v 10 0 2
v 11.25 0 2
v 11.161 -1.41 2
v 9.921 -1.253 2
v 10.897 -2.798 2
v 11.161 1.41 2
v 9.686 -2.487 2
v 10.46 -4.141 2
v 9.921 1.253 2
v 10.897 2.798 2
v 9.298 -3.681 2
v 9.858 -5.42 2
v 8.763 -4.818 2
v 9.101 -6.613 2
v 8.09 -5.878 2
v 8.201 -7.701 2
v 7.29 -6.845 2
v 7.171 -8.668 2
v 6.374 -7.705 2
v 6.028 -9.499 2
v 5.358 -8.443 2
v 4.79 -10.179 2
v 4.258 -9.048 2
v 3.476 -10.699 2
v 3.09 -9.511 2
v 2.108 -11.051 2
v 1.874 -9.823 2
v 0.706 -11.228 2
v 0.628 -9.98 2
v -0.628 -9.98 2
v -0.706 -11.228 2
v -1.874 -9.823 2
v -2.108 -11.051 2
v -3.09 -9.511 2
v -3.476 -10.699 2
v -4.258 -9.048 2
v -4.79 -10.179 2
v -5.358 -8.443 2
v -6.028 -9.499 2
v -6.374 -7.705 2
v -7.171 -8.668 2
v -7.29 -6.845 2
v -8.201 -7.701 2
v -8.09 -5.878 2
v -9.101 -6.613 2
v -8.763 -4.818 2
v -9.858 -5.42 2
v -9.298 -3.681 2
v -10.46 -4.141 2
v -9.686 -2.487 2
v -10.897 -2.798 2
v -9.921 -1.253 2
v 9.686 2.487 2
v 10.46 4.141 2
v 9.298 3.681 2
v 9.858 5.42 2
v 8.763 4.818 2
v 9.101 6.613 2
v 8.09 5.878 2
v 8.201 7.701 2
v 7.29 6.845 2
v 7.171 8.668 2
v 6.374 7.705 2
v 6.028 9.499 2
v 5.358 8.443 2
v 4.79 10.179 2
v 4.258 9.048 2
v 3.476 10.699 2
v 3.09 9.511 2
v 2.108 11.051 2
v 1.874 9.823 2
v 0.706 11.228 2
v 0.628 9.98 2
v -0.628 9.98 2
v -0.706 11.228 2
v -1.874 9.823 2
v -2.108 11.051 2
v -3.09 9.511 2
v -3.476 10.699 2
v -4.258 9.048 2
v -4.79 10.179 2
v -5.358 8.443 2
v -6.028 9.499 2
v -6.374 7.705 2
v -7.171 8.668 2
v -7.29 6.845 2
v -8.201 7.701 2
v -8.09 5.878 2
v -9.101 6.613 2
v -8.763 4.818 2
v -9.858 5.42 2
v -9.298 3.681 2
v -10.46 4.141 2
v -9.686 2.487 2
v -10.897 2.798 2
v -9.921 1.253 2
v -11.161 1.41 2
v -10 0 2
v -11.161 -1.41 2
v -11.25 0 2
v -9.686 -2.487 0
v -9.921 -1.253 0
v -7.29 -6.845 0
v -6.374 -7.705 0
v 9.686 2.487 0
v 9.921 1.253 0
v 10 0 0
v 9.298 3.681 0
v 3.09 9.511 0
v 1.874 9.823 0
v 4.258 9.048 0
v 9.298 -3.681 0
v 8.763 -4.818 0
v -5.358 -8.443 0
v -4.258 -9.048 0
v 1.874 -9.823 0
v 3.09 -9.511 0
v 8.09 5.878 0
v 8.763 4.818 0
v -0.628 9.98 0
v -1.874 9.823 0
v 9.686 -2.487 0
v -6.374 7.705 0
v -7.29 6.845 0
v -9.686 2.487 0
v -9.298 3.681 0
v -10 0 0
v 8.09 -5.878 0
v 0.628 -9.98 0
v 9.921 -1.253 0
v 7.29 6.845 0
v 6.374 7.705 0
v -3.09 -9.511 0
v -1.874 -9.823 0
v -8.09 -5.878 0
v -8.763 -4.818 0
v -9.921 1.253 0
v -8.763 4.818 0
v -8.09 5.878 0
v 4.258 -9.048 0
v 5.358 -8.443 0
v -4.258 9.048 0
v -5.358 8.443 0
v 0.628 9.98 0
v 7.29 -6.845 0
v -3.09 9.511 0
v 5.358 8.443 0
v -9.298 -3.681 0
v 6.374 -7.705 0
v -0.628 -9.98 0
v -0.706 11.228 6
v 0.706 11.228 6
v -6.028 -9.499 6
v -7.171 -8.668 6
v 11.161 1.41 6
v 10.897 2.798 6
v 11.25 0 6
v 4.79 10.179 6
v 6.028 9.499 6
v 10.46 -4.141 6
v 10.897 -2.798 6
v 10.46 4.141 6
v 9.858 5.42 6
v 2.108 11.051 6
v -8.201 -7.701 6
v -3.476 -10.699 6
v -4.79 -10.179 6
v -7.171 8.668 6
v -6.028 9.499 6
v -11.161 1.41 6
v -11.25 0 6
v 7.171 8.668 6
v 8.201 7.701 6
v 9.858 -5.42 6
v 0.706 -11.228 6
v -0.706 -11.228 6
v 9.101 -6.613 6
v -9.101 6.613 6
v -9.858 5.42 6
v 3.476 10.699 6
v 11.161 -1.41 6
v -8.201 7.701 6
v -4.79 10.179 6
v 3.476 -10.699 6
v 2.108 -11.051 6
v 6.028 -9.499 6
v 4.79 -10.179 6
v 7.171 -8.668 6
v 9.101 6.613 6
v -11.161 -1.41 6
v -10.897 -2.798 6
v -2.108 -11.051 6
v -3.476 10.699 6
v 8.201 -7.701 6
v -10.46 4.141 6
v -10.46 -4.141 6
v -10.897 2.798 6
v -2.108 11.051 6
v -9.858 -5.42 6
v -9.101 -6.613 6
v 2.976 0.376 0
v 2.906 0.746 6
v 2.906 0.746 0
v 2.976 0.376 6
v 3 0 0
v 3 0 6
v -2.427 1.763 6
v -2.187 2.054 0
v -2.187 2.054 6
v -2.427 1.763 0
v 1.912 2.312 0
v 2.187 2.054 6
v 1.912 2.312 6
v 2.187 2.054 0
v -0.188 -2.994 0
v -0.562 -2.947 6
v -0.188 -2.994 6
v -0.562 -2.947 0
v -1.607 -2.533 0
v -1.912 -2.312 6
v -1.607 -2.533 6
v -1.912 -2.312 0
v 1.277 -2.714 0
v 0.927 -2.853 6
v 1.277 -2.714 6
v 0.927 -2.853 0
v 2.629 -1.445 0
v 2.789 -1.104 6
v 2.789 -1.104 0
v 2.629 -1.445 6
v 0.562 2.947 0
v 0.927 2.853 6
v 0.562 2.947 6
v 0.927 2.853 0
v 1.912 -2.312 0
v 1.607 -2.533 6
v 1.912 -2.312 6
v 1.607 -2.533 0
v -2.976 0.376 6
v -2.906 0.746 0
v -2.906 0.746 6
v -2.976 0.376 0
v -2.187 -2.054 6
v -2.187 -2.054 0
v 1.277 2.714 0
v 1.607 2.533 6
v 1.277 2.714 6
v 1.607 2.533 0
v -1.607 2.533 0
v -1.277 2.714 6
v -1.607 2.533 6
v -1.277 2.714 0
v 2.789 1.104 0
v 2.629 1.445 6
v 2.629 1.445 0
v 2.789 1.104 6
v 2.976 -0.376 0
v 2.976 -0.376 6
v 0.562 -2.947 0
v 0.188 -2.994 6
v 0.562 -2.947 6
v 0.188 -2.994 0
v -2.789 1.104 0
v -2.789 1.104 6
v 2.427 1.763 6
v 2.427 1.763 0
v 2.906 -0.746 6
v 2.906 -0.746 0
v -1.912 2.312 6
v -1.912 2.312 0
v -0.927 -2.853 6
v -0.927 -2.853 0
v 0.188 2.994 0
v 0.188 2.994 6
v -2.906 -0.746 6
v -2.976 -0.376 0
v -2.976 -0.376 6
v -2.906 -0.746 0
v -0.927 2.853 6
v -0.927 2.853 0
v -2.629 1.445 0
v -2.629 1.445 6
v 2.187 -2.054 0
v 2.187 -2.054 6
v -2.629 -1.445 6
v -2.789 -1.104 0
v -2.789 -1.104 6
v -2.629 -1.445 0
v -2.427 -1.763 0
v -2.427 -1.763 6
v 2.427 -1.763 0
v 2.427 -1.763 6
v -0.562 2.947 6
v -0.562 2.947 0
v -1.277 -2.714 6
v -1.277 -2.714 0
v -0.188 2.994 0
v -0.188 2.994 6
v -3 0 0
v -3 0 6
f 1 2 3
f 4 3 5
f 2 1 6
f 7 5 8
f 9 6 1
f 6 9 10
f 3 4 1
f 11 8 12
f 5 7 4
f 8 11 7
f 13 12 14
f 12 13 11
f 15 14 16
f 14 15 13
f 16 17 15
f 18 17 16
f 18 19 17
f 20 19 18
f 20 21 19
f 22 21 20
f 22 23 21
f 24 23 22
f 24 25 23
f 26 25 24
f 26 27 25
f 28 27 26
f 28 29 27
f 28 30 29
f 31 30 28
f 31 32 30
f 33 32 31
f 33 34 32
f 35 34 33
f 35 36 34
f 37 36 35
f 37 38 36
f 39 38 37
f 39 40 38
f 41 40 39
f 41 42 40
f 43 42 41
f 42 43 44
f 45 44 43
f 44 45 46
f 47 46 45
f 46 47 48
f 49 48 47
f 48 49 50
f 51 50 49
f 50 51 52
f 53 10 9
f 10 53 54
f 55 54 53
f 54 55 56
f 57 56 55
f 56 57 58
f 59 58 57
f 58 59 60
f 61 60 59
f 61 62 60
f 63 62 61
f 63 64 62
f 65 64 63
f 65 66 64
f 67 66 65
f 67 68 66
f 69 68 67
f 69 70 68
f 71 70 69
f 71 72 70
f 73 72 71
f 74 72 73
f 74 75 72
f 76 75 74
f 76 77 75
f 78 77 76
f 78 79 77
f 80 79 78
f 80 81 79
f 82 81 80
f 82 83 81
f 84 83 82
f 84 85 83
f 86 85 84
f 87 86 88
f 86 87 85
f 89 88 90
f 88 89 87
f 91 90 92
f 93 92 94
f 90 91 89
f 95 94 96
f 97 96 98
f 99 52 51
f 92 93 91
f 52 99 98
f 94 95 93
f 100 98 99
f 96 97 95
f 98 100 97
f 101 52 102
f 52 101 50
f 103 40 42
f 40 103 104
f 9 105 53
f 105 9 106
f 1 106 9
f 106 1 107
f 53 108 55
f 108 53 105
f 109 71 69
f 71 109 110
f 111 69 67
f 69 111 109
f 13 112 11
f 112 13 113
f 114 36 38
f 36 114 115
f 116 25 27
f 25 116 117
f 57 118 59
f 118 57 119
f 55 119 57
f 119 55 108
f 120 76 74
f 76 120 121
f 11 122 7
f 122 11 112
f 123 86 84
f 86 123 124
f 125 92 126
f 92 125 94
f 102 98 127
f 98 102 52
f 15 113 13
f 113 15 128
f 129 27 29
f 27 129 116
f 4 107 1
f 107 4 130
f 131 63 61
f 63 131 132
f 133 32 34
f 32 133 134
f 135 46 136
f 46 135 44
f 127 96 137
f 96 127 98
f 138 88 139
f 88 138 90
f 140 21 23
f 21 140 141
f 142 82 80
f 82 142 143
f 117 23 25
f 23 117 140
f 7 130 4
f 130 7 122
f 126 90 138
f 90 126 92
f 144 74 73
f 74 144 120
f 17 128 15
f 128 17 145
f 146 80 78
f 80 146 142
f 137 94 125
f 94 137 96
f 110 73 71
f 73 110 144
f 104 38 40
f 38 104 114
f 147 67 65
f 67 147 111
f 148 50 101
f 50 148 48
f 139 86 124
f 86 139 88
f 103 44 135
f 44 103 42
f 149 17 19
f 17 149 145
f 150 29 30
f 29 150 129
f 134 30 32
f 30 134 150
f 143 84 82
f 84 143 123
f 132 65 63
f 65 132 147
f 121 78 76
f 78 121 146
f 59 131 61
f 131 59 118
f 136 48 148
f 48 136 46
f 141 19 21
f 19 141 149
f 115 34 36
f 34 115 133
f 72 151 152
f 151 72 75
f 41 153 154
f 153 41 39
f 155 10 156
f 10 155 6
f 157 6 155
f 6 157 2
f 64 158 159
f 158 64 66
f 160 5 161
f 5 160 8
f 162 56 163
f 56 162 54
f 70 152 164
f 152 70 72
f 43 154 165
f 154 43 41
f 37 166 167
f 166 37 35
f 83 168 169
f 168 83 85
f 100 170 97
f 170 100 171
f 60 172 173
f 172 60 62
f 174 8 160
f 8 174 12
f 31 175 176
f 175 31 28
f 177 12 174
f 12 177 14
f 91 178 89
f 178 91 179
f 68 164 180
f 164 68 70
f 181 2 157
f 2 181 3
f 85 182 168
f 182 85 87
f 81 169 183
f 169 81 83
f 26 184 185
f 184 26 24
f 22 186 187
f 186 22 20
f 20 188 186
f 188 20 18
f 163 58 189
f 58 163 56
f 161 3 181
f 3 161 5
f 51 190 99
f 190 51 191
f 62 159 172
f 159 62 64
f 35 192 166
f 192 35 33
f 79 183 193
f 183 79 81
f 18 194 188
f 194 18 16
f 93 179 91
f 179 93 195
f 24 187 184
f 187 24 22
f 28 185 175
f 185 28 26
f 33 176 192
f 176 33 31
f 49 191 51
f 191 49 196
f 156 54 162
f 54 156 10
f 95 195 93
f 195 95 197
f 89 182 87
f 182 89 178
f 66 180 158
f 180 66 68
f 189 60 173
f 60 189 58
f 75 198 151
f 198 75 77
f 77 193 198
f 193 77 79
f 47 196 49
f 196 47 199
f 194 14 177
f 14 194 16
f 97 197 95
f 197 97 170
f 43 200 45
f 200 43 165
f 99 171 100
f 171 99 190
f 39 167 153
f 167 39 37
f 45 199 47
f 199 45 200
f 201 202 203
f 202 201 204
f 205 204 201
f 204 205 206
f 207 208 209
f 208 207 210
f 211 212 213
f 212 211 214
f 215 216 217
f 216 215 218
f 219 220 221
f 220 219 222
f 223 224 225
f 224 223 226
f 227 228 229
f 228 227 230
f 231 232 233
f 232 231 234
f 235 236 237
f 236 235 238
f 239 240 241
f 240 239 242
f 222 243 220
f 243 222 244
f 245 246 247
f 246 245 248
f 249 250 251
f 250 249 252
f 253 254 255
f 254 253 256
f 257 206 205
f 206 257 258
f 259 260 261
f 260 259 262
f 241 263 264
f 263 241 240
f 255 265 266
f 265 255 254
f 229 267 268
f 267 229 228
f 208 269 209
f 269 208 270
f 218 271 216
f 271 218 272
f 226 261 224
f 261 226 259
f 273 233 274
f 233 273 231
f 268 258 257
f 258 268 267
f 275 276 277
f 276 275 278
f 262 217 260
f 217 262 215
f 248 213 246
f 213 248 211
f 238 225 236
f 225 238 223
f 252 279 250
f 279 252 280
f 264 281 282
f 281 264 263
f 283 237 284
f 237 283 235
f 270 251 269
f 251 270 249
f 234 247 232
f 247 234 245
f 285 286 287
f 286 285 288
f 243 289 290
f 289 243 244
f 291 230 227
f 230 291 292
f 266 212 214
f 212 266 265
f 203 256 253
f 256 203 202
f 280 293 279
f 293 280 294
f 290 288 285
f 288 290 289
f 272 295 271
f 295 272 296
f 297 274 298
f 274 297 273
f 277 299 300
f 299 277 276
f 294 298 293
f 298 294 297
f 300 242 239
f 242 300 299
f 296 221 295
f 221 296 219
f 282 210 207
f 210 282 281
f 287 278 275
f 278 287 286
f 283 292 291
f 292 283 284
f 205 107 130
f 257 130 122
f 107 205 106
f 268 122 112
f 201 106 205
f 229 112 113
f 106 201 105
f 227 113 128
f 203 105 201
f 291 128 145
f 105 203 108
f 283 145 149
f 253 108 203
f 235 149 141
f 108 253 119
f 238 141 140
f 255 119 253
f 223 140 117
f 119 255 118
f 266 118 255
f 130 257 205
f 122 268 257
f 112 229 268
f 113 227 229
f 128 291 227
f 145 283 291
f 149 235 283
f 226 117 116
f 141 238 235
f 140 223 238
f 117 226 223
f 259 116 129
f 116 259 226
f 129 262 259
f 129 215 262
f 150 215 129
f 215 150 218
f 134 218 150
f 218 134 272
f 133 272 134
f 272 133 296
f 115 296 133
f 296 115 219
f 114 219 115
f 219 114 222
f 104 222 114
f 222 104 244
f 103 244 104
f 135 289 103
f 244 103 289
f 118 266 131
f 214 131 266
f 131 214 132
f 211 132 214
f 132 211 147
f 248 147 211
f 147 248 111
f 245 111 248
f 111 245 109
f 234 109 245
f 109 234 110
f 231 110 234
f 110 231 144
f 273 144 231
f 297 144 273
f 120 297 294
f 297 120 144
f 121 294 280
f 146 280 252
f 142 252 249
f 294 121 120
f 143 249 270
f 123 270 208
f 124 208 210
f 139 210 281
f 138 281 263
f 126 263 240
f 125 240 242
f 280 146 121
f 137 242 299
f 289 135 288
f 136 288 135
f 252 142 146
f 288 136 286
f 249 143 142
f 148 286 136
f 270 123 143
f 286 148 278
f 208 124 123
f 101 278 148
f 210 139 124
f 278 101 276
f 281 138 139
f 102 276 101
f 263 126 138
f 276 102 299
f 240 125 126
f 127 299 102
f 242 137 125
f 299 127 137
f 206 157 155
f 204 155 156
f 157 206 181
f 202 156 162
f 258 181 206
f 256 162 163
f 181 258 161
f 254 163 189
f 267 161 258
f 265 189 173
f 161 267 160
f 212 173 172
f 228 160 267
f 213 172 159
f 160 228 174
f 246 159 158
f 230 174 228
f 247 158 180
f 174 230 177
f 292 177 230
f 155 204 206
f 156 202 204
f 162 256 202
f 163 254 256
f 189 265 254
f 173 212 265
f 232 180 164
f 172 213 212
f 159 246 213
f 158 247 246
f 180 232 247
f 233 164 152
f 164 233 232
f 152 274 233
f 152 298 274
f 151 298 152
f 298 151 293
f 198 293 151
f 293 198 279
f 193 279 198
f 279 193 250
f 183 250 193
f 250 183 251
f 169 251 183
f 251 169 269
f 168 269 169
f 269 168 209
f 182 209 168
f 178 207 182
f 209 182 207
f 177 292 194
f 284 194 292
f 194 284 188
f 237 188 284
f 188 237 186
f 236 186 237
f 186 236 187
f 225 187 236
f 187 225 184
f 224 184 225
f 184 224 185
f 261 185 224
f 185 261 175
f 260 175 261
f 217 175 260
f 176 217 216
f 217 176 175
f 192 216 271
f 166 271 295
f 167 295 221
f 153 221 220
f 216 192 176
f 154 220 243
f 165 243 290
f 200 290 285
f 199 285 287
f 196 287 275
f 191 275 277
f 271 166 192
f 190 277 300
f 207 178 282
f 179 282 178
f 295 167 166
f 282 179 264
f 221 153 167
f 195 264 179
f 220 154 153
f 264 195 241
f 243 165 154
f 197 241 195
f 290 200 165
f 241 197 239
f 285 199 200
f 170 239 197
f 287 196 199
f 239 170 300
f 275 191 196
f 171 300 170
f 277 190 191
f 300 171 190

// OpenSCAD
$fn = 50;


difference() {
	union() {
		*color(alpha = 1.0000000000, c = "gray") {
			translate(v = [0, 7, 0]) {
				linear_extrude(height = 12) {
					text(font = "Arial:style=Bold", halign = "center", size = 4.5000000000, text = "COMMENT bearing_plate_plate", valign = "center");
				}
			}
		}
		*color(alpha = 1.0000000000, c = "gray") {
			translate(v = [0, 14, 0]) {
				linear_extrude(height = 12) {
					text(font = "Arial:style=Bold", halign = "center", size = 4.5000000000, text = "COMMENT description oobb_cylinder_shape_p_type_12_depth_3_width_12_height_12_thickness_motor_building_block_large_01_shaft_p_t_12.0_radius_all_mode", valign = "center");
				}
			}
		}
		translate(v = [0, 0, -6.0000000000]) {
			cylinder(h = 12, r = 12.0000000000);
		}
		*color(alpha = 1.0000000000, c = "gray") {
			translate(v = [0, 7, 0]) {
				linear_extrude(height = 1) {
					text(font = "Arial:style=Bold", halign = "center", size = 4.5000000000, text = "COMMENT bearing_plate_slice", valign = "center");
				}
			}
		}
	}
	union() {
		translate(v = [14.2500000000, 4.7500000000, -10.0000000000]) {
			rotate(a = [0, 0, 0]) {
				difference() {
					union() {
						translate(v = [0, 0, -25.0000000000]) {
							cylinder(h = 25, r = 1.5000000000);
						}
						translate(v = [0, 0, -25.0000000000]) {
							cylinder(h = 25, r = 1.8000000000);
						}
						cylinder(h = 3, r = 2.9000000000);
						translate(v = [0, 0, -25.0000000000]) {
							cylinder(h = 25, r = 1.5000000000);
						}
					}
					union();
				}
			}
		}
		translate(v = [14.2500000000, -4.7500000000, -10.0000000000]) {
			rotate(a = [0, 0, 0]) {
				difference() {
					union() {
						translate(v = [0, 0, -25.0000000000]) {
							cylinder(h = 25, r = 1.5000000000);
						}
						translate(v = [0, 0, -25.0000000000]) {
							cylinder(h = 25, r = 1.8000000000);
						}
						cylinder(h = 3, r = 2.9000000000);
						translate(v = [0, 0, -25.0000000000]) {
							cylinder(h = 25, r = 1.5000000000);
						}
					}
					union();
				}
			}
		}
		translate(v = [-36.2500000000, 4.7500000000, -10.0000000000]) {
			rotate(a = [0, 0, 0]) {
				difference() {
					union() {
						translate(v = [0, 0, -25.0000000000]) {
							cylinder(h = 25, r = 1.5000000000);
						}
						translate(v = [0, 0, -25.0000000000]) {
							cylinder(h = 25, r = 1.8000000000);
						}
						cylinder(h = 3, r = 2.9000000000);
						translate(v = [0, 0, -25.0000000000]) {
							cylinder(h = 25, r = 1.5000000000);
						}
					}
					union();
				}
			}
		}
		translate(v = [-36.2500000000, -4.7500000000, -10.0000000000]) {
			rotate(a = [0, 0, 0]) {
				difference() {
					union() {
						translate(v = [0, 0, -25.0000000000]) {
							cylinder(h = 25, r = 1.5000000000);
						}
						translate(v = [0, 0, -25.0000000000]) {
							cylinder(h = 25, r = 1.8000000000);
						}
						cylinder(h = 3, r = 2.9000000000);
						translate(v = [0, 0, -25.0000000000]) {
							cylinder(h = 25, r = 1.5000000000);
						}
					}
					union();
				}
			}
		}
		translate(v = [18.0000000000, 0, -6.0000000000]) {
			rotate(a = [0, 180, 30.0000000000]) {
				difference() {
					union() {
						translate(v = [0, 0, -12.0000000000]) {
							cylinder(h = 12, r = 1.5000000000);
						}
						translate(v = [0, 0, -12.0000000000]) {
							linear_extrude(height = 2.5000000000) {
								polygon(points = [[3.1735000000, 0.0000000000], [1.5867500000, 2.7483316189], [-1.5867500000, 2.7483316189], [-3.1735000000, 0.0000000000], [-1.5867500000, -2.7483316189], [1.5867500000, -2.7483316189]]);
							}
						}
						translate(v = [0, 0, -12.0000000000]) {
							cylinder(h = 12, r = 1.8000000000);
						}
						translate(v = [0, 0, -12.0000000000]) {
							linear_extrude(height = 2.5000000000) {
								polygon(points = [[3.1735000000, 0.0000000000], [1.5867500000, 2.7483316189], [-1.5867500000, 2.7483316189], [-3.1735000000, 0.0000000000], [-1.5867500000, -2.7483316189], [1.5867500000, -2.7483316189]]);
							}
						}
						translate(v = [0, 0, -0.8500000000]) {
							cylinder(r1 = 1.5000000000, r2 = 2.9000000000);
						}
						translate(v = [0, 0, -12.0000000000]) {
							cylinder(h = 12, r = 1.5000000000);
						}
						translate(v = [0, 0, -12.0000000000]) {
							linear_extrude(height = 2.5000000000) {
								polygon(points = [[3.1735000000, 0.0000000000], [1.5867500000, 2.7483316189], [-1.5867500000, 2.7483316189], [-3.1735000000, 0.0000000000], [-1.5867500000, -2.7483316189], [1.5867500000, -2.7483316189]]);
							}
						}
					}
					union();
				}
			}
		}
		translate(v = [-18.0000000000, 0, -6.0000000000]) {
			rotate(a = [0, 180, 30.0000000000]) {
				difference() {
					union() {
						translate(v = [0, 0, -12.0000000000]) {
							cylinder(h = 12, r = 1.5000000000);
						}
						translate(v = [0, 0, -12.0000000000]) {
							linear_extrude(height = 2.5000000000) {
								polygon(points = [[3.1735000000, 0.0000000000], [1.5867500000, 2.7483316189], [-1.5867500000, 2.7483316189], [-3.1735000000, 0.0000000000], [-1.5867500000, -2.7483316189], [1.5867500000, -2.7483316189]]);
							}
						}
						translate(v = [0, 0, -12.0000000000]) {
							cylinder(h = 12, r = 1.8000000000);
						}
						translate(v = [0, 0, -12.0000000000]) {
							linear_extrude(height = 2.5000000000) {
								polygon(points = [[3.1735000000, 0.0000000000], [1.5867500000, 2.7483316189], [-1.5867500000, 2.7483316189], [-3.1735000000, 0.0000000000], [-1.5867500000, -2.7483316189], [1.5867500000, -2.7483316189]]);
							}
						}
						translate(v = [0, 0, -0.8500000000]) {
							cylinder(r1 = 1.5000000000, r2 = 2.9000000000);
						}
						translate(v = [0, 0, -12.0000000000]) {
							cylinder(h = 12, r = 1.5000000000);
						}
						translate(v = [0, 0, -12.0000000000]) {
							linear_extrude(height = 2.5000000000) {
								polygon(points = [[3.1735000000, 0.0000000000], [1.5867500000, 2.7483316189], [-1.5867500000, 2.7483316189], [-3.1735000000, 0.0000000000], [-1.5867500000, -2.7483316189], [1.5867500000, -2.7483316189]]);
							}
						}
					}
					union();
				}
			}
		}
		translate(v = [0, 18.0000000000, 6.0000000000]) {
			rotate(a = [0, 0, 0]) {
				difference() {
					union() {
						translate(v = [0, 0, -12.0000000000]) {
							cylinder(h = 12, r = 1.5000000000);
						}
						translate(v = [0, 0, -12.0000000000]) {
							linear_extrude(height = 2.5000000000) {
								polygon(points = [[3.1735000000, 0.0000000000], [1.5867500000, 2.7483316189], [-1.5867500000, 2.7483316189], [-3.1735000000, 0.0000000000], [-1.5867500000, -2.7483316189], [1.5867500000, -2.7483316189]]);
							}
						}
						translate(v = [0, 0, -12.0000000000]) {
							cylinder(h = 12, r = 1.8000000000);
						}
						translate(v = [0, 0, -12.0000000000]) {
							linear_extrude(height = 2.5000000000) {
								polygon(points = [[3.1735000000, 0.0000000000], [1.5867500000, 2.7483316189], [-1.5867500000, 2.7483316189], [-3.1735000000, 0.0000000000], [-1.5867500000, -2.7483316189], [1.5867500000, -2.7483316189]]);
							}
						}
						translate(v = [0, 0, -0.8500000000]) {
							cylinder(r1 = 1.5000000000, r2 = 2.9000000000);
						}
						translate(v = [0, 0, -12.0000000000]) {
							cylinder(h = 12, r = 1.5000000000);
						}
						translate(v = [0, 0, -12.0000000000]) {
							linear_extrude(height = 2.5000000000) {
								polygon(points = [[3.1735000000, 0.0000000000], [1.5867500000, 2.7483316189], [-1.5867500000, 2.7483316189], [-3.1735000000, 0.0000000000], [-1.5867500000, -2.7483316189], [1.5867500000, -2.7483316189]]);
							}
						}
					}
					union();
				}
			}
		}
		translate(v = [0, -18.0000000000, 6.0000000000]) {
			rotate(a = [0, 0, 0]) {
				difference() {
					union() {
						translate(v = [0, 0, -12.0000000000]) {
							cylinder(h = 12, r = 1.5000000000);
						}
						translate(v = [0, 0, -12.0000000000]) {
							linear_extrude(height = 2.5000000000) {
								polygon(points = [[3.1735000000, 0.0000000000], [1.5867500000, 2.7483316189], [-1.5867500000, 2.7483316189], [-3.1735000000, 0.0000000000], [-1.5867500000, -2.7483316189], [1.5867500000, -2.7483316189]]);
							}
						}
						translate(v = [0, 0, -12.0000000000]) {
							cylinder(h = 12, r = 1.8000000000);
						}
						translate(v = [0, 0, -12.0000000000]) {
							linear_extrude(height = 2.5000000000) {
								polygon(points = [[3.1735000000, 0.0000000000], [1.5867500000, 2.7483316189], [-1.5867500000, 2.7483316189], [-3.1735000000, 0.0000000000], [-1.5867500000, -2.7483316189], [1.5867500000, -2.7483316189]]);
							}
						}
						translate(v = [0, 0, -0.8500000000]) {
							cylinder(r1 = 1.5000000000, r2 = 2.9000000000);
						}
						translate(v = [0, 0, -12.0000000000]) {
							cylinder(h = 12, r = 1.5000000000);
						}
						translate(v = [0, 0, -12.0000000000]) {
							linear_extrude(height = 2.5000000000) {
								polygon(points = [[3.1735000000, 0.0000000000], [1.5867500000, 2.7483316189], [-1.5867500000, 2.7483316189], [-3.1735000000, 0.0000000000], [-1.5867500000, -2.7483316189], [1.5867500000, -2.7483316189]]);
							}
						}
					}
					union();
				}
			}
		}
		*color(alpha = 1.0000000000, c = "gray") {
			translate(v = [0, 14, 0]) {
				linear_extrude(height = 3) {
					text(font = "Arial:style=Bold", halign = "center", size = 4.5000000000, text = "COMMENT description oobb_bearing_shape_n_type_12_depth_3_width_3_height_12_thickness_motor_building_block_large_01_shaft_6704_bearing", valign = "center");
				}
			}
		}
		translate(v = [0, 0, -2.0000000000]) {
			union() {
				difference() {
					cylinder(h = 4, r = 13.5000000000);
					cylinder(h = 4, r = 10.0000000000);
				}
				difference() {
					translate(v = [0, 0, -50]) {
						cylinder(h = 100, r = 12.2500000000);
					}
					translate(v = [0, 0, -50]) {
						cylinder(h = 100, r = 11.2500000000);
					}
				}
			}
		}
		*color(alpha = 1.0000000000, c = "gray") {
			translate(v = [0, 14, 0]) {
				linear_extrude(height = 3) {
					text(font = "Arial:style=Bold", halign = "center", size = 4.5000000000, text = "COMMENT description oobb_holes_shape_n_type_m6_radius_name_3_width_3_height_12_thickness_motor_building_block_large_01_shaft_perimeter_miss_middle_holes", valign = "center");
				}
			}
		}
		translate(v = [-15.0000000000, -15.0000000000, -50.0000000000]) {
			cylinder(h = 100, r = 3.0000000000);
		}
		translate(v = [-15.0000000000, 15.0000000000, -50.0000000000]) {
			cylinder(h = 100, r = 3.0000000000);
		}
		translate(v = [15.0000000000, -15.0000000000, -50.0000000000]) {
			cylinder(h = 100, r = 3.0000000000);
		}
		translate(v = [15.0000000000, 15.0000000000, -50.0000000000]) {
			cylinder(h = 100, r = 3.0000000000);
		}
		*color(alpha = 1.0000000000, c = "gray") {
			translate(v = [0, 14, -6.0000000000]) {
				linear_extrude(height = 3) {
					text(font = "Arial:style=Bold", halign = "center", size = 4.5000000000, text = "COMMENT description oobb_motor_building_block_large_01_shape_n_type_0_0_-6.0_pos_3_width_3_height_12_thickness_motor_building_block_large_01_shaft", valign = "center");
				}
			}
		}
		translate(v = [0, 0, -56.0000000000]) {
			cylinder(h = 100, r = 3.0000000000);
		}
		translate(v = [14.2500000000, 4.7500000000, -56.0000000000]) {
			cylinder(h = 100, r = 1.5000000000);
		}
		translate(v = [14.2500000000, -4.7500000000, -56.0000000000]) {
			cylinder(h = 100, r = 1.5000000000);
		}
		translate(v = [-36.2500000000, 4.7500000000, -56.0000000000]) {
			cylinder(h = 100, r = 1.5000000000);
		}
		translate(v = [-36.2500000000, -4.7500000000, -56.0000000000]) {
			cylinder(h = 100, r = 1.5000000000);
		}
		translate(v = [-32.2500000000, -10.7500000000, -46.0000000000]) {
			cube(size = [42.5000000000, 21.5000000000, 40]);
		}
		translate(v = [-36.2500000000, -1.7500000000, -14.5000000000]) {
			cube(size = [50.5000000000, 3.5000000000, 3]);
		}
		translate(v = [-41.7500000000, -10.7500000000, -17.0000000000]) {
			cube(size = [61.5000000000, 21.5000000000, 2.5000000000]);
		}
		*color(alpha = 1.0000000000, c = "gray") {
			translate(v = [18.0000000000, 14, -6.0000000000]) {
				rotate(a = [0, 180, 30.0000000000]) {
					linear_extrude(height = 3) {
						text(font = "Arial:style=Bold", halign = "center", size = 4.5000000000, text = "COMMENT description oobb_screw_countersunk_shape_n_type_m3_radius_name_12_depth_18.0_0_-6.0_pos_3_width_3_height_12_thickness_motor_building_block_large_01_shaft_0_180_30.0_rot_true_nut_true_overhang", valign = "center");
					}
				}
			}
		}
		*color(alpha = 1.0000000000, c = "gray") {
			translate(v = [-18.0000000000, 14, -6.0000000000]) {
				rotate(a = [0, 180, 30.0000000000]) {
					linear_extrude(height = 3) {
						text(font = "Arial:style=Bold", halign = "center", size = 4.5000000000, text = "COMMENT description oobb_screw_countersunk_shape_n_type_m3_radius_name_12_depth_-18.0_0_-6.0_pos_3_width_3_height_12_thickness_motor_building_block_large_01_shaft_0_180_30.0_rot_true_nut_true_overhang", valign = "center");
					}
				}
			}
		}
		*color(alpha = 1.0000000000, c = "gray") {
			translate(v = [0, 32.0000000000, 6.0000000000]) {
				linear_extrude(height = 3) {
					text(font = "Arial:style=Bold", halign = "center", size = 4.5000000000, text = "COMMENT description oobb_screw_countersunk_shape_n_type_m3_radius_name_12_depth_0_18.0_6.0_pos_3_width_3_height_12_thickness_motor_building_block_large_01_shaft_0_0_0_rot_true_nut_true_overhang", valign = "center");
				}
			}
		}
		*color(alpha = 1.0000000000, c = "gray") {
			translate(v = [0, -4.0000000000, 6.0000000000]) {
				linear_extrude(height = 3) {
					text(font = "Arial:style=Bold", halign = "center", size = 4.5000000000, text = "COMMENT description oobb_screw_countersunk_shape_n_type_m3_radius_name_12_depth_0_-18.0_6.0_pos_3_width_3_height_12_thickness_motor_building_block_large_01_shaft_0_0_0_rot_true_nut_true_overhang", valign = "center");
				}
			}
		}
		*color(alpha = 1.0000000000, c = "gray") {
			translate(v = [0, 14, 0]) {
				linear_extrude(height = 1) {
					text(font = "Arial:style=Bold", halign = "center", size = 4.5000000000, text = "COMMENT description oobb_slice_shape_n_type_3dpr_mode_top_zz", valign = "center");
				}
			}
		}
		translate(v = [-250, -250, -500]) {
			cube(size = [500, 500, 500]);
		}
	}
}
